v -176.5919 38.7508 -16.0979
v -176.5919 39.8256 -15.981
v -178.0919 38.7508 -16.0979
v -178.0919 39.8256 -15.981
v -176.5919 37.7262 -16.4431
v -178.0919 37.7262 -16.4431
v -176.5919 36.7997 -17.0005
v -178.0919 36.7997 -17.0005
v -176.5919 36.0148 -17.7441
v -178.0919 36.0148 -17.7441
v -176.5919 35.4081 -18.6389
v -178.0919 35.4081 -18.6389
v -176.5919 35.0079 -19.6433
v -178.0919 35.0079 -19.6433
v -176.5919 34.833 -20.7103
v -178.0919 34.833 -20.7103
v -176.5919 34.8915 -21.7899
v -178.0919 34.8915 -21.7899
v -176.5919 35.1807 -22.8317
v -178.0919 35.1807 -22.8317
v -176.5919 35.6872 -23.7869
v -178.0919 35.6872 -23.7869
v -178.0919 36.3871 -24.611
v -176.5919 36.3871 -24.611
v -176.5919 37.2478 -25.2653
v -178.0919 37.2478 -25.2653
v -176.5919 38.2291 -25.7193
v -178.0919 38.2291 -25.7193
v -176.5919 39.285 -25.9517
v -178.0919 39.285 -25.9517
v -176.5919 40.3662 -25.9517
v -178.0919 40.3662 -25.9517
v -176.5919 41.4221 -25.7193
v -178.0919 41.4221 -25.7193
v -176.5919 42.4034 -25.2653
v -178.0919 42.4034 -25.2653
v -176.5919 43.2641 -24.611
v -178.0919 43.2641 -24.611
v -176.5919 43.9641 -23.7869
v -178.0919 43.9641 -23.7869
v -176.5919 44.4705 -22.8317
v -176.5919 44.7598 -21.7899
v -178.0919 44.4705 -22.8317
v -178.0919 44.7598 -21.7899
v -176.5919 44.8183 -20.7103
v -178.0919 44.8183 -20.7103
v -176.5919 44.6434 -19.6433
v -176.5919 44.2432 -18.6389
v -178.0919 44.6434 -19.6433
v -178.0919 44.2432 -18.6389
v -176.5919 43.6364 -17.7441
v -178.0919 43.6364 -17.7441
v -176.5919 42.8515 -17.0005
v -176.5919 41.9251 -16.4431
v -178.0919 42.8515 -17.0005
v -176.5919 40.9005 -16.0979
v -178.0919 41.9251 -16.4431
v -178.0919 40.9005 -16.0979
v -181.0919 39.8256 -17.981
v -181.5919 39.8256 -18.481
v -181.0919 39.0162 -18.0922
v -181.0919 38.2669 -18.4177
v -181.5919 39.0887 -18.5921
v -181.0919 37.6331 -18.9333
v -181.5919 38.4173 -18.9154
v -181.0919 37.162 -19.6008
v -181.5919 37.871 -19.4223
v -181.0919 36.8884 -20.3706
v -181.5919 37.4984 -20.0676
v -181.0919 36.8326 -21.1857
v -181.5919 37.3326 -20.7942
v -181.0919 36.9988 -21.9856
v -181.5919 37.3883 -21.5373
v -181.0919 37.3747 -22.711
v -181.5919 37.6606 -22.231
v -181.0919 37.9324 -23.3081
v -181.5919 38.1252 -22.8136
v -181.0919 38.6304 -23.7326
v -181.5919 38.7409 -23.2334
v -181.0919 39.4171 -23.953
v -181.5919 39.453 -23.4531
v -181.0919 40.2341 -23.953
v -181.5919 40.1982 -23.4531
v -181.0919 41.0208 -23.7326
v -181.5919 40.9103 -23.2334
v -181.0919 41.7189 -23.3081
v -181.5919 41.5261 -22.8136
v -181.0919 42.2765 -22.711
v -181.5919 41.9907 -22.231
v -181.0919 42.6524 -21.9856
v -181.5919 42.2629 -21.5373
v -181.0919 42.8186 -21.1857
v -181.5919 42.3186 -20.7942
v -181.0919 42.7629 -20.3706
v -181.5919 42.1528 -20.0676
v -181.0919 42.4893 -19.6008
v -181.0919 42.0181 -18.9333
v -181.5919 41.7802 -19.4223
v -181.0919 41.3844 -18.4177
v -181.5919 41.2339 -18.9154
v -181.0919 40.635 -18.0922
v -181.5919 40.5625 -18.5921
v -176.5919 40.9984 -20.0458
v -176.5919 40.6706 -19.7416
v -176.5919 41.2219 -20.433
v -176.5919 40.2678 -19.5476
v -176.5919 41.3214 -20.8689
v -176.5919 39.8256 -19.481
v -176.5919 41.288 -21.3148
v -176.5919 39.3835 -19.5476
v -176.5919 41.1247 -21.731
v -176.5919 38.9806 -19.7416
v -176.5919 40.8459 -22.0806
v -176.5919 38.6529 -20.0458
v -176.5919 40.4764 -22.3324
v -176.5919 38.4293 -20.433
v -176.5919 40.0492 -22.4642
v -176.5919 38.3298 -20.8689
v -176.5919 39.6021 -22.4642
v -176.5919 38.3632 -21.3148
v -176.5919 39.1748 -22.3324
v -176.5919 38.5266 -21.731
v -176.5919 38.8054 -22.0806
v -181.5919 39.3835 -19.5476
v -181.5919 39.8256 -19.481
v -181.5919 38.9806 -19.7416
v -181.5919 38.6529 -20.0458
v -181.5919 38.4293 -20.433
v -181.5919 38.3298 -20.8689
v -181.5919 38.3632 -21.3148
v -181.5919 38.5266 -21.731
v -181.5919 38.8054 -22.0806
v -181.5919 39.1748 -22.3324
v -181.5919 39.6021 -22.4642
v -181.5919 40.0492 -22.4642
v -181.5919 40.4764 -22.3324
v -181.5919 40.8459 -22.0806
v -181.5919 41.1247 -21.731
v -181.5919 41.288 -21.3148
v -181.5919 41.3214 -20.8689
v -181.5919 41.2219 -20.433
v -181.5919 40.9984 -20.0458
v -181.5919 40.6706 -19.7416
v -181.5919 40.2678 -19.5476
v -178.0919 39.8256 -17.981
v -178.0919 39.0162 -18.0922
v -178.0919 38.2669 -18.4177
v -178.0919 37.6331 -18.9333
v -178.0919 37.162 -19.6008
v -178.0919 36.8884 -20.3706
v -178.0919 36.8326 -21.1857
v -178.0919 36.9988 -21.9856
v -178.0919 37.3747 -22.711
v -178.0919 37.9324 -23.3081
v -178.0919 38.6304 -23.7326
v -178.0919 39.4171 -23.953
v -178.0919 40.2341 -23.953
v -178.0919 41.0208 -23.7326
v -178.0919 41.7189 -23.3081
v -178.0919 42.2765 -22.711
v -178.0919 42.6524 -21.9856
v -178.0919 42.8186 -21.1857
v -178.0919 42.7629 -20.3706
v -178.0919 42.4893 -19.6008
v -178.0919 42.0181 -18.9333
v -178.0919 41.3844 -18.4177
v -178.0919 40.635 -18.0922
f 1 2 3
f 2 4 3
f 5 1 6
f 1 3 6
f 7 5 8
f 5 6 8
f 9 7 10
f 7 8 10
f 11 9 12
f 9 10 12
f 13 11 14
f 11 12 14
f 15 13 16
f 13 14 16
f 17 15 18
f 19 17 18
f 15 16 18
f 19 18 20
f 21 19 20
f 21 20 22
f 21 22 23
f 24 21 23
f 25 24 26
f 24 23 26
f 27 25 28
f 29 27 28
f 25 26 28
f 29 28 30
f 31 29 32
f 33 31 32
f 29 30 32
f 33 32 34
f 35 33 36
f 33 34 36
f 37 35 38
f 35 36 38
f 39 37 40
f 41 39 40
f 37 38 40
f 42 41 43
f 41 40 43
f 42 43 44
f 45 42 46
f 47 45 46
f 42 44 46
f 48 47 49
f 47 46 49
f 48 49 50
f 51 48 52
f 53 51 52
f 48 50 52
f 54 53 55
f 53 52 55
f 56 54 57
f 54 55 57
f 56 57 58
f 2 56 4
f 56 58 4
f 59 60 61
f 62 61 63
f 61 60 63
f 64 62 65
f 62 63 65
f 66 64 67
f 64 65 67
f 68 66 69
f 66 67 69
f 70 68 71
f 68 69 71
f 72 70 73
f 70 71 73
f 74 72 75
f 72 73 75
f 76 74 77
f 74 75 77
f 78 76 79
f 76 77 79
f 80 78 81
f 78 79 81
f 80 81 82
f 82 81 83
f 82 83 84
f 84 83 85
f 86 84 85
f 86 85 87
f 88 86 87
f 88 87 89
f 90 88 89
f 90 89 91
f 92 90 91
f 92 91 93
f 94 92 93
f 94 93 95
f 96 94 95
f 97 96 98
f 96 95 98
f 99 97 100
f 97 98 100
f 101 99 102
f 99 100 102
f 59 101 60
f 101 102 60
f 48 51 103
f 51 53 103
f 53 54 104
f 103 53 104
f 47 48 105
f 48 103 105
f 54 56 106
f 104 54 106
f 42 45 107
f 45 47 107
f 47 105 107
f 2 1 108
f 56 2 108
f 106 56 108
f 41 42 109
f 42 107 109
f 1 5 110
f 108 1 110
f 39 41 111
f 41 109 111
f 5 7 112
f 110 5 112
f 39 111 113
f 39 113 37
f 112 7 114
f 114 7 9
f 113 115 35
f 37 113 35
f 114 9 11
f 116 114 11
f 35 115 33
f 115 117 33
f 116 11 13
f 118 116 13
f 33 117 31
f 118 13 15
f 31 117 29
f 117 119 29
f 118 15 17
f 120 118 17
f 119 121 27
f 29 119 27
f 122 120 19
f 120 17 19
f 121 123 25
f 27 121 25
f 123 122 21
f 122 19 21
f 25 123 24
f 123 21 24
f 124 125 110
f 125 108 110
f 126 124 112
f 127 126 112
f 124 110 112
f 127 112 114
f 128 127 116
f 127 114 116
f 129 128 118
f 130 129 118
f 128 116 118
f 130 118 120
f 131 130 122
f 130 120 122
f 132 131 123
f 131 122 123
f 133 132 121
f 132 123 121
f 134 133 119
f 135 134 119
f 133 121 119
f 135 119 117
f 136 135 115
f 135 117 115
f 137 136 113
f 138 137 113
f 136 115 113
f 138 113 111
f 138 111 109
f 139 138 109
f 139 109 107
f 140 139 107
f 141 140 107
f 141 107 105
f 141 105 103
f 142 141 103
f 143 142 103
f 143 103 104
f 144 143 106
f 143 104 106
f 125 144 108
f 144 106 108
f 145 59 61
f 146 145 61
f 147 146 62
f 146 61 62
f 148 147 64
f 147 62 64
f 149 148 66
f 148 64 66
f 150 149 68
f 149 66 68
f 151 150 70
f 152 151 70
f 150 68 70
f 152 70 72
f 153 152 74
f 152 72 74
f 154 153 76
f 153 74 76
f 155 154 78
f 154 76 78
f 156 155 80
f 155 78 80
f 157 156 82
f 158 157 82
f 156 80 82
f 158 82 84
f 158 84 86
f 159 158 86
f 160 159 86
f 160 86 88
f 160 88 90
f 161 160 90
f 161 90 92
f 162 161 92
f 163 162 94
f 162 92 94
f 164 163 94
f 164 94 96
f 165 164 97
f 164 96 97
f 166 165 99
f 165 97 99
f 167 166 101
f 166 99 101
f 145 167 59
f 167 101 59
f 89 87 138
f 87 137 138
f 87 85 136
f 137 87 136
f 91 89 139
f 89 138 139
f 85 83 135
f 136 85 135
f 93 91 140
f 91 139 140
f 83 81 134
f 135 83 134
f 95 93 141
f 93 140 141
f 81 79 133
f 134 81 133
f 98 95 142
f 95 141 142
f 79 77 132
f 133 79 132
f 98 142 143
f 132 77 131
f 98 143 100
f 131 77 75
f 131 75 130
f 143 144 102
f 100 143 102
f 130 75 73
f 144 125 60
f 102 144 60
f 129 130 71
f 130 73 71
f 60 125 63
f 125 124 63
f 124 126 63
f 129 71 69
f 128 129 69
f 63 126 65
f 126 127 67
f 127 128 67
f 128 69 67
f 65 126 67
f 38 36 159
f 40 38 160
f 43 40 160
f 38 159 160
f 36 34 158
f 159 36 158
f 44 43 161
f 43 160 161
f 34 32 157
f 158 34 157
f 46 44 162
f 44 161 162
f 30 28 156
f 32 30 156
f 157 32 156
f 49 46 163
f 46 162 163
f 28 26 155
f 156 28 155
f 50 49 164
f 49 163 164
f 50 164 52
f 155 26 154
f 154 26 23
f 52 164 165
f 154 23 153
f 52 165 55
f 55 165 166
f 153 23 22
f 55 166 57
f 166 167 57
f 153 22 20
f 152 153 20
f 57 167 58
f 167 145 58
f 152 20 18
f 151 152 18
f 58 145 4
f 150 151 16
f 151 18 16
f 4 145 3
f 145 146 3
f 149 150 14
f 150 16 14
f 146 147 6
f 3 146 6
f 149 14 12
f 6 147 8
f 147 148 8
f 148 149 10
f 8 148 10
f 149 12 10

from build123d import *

# Parameters (mm, degrees)
CHANFREIN1_SIZE = 0.5


with BuildPart() as part:
    # Esquisse1 → Révolution1 (revolve)
    with BuildSketch(Plane(origin=(0, 0, -20.980989745), x_dir=(-1, 0, 0), z_dir=(0, 0, -1)), mode=Mode.PRIVATE) as r_volution1_sk:
        Polygon((176.591924368, 38.325618202), (176.591924368, 34.825618202), (178.091924368, 34.825618202), (178.091924368, 36.825618202), (181.591924368, 36.825618202), (181.591924368, 38.325618202), align=None)
    revolve(r_volution1_sk.sketch.rotate(Axis((-182.472480167, 39.825618202, -20.980989745), (1, 0, 0)), 270), axis=Axis((-182.472480167, 39.825618202, -20.980989745), (1, 0, 0)))

    # Chanfrein1
    chanfrein1_edges = [part.edges().sort_by_distance(p)[0] for p in [
        (-181.591924368, 39.825618202, -23.980989745),
    ]]
    chamfer(chanfrein1_edges, length=CHANFREIN1_SIZE)


solid = part.part
